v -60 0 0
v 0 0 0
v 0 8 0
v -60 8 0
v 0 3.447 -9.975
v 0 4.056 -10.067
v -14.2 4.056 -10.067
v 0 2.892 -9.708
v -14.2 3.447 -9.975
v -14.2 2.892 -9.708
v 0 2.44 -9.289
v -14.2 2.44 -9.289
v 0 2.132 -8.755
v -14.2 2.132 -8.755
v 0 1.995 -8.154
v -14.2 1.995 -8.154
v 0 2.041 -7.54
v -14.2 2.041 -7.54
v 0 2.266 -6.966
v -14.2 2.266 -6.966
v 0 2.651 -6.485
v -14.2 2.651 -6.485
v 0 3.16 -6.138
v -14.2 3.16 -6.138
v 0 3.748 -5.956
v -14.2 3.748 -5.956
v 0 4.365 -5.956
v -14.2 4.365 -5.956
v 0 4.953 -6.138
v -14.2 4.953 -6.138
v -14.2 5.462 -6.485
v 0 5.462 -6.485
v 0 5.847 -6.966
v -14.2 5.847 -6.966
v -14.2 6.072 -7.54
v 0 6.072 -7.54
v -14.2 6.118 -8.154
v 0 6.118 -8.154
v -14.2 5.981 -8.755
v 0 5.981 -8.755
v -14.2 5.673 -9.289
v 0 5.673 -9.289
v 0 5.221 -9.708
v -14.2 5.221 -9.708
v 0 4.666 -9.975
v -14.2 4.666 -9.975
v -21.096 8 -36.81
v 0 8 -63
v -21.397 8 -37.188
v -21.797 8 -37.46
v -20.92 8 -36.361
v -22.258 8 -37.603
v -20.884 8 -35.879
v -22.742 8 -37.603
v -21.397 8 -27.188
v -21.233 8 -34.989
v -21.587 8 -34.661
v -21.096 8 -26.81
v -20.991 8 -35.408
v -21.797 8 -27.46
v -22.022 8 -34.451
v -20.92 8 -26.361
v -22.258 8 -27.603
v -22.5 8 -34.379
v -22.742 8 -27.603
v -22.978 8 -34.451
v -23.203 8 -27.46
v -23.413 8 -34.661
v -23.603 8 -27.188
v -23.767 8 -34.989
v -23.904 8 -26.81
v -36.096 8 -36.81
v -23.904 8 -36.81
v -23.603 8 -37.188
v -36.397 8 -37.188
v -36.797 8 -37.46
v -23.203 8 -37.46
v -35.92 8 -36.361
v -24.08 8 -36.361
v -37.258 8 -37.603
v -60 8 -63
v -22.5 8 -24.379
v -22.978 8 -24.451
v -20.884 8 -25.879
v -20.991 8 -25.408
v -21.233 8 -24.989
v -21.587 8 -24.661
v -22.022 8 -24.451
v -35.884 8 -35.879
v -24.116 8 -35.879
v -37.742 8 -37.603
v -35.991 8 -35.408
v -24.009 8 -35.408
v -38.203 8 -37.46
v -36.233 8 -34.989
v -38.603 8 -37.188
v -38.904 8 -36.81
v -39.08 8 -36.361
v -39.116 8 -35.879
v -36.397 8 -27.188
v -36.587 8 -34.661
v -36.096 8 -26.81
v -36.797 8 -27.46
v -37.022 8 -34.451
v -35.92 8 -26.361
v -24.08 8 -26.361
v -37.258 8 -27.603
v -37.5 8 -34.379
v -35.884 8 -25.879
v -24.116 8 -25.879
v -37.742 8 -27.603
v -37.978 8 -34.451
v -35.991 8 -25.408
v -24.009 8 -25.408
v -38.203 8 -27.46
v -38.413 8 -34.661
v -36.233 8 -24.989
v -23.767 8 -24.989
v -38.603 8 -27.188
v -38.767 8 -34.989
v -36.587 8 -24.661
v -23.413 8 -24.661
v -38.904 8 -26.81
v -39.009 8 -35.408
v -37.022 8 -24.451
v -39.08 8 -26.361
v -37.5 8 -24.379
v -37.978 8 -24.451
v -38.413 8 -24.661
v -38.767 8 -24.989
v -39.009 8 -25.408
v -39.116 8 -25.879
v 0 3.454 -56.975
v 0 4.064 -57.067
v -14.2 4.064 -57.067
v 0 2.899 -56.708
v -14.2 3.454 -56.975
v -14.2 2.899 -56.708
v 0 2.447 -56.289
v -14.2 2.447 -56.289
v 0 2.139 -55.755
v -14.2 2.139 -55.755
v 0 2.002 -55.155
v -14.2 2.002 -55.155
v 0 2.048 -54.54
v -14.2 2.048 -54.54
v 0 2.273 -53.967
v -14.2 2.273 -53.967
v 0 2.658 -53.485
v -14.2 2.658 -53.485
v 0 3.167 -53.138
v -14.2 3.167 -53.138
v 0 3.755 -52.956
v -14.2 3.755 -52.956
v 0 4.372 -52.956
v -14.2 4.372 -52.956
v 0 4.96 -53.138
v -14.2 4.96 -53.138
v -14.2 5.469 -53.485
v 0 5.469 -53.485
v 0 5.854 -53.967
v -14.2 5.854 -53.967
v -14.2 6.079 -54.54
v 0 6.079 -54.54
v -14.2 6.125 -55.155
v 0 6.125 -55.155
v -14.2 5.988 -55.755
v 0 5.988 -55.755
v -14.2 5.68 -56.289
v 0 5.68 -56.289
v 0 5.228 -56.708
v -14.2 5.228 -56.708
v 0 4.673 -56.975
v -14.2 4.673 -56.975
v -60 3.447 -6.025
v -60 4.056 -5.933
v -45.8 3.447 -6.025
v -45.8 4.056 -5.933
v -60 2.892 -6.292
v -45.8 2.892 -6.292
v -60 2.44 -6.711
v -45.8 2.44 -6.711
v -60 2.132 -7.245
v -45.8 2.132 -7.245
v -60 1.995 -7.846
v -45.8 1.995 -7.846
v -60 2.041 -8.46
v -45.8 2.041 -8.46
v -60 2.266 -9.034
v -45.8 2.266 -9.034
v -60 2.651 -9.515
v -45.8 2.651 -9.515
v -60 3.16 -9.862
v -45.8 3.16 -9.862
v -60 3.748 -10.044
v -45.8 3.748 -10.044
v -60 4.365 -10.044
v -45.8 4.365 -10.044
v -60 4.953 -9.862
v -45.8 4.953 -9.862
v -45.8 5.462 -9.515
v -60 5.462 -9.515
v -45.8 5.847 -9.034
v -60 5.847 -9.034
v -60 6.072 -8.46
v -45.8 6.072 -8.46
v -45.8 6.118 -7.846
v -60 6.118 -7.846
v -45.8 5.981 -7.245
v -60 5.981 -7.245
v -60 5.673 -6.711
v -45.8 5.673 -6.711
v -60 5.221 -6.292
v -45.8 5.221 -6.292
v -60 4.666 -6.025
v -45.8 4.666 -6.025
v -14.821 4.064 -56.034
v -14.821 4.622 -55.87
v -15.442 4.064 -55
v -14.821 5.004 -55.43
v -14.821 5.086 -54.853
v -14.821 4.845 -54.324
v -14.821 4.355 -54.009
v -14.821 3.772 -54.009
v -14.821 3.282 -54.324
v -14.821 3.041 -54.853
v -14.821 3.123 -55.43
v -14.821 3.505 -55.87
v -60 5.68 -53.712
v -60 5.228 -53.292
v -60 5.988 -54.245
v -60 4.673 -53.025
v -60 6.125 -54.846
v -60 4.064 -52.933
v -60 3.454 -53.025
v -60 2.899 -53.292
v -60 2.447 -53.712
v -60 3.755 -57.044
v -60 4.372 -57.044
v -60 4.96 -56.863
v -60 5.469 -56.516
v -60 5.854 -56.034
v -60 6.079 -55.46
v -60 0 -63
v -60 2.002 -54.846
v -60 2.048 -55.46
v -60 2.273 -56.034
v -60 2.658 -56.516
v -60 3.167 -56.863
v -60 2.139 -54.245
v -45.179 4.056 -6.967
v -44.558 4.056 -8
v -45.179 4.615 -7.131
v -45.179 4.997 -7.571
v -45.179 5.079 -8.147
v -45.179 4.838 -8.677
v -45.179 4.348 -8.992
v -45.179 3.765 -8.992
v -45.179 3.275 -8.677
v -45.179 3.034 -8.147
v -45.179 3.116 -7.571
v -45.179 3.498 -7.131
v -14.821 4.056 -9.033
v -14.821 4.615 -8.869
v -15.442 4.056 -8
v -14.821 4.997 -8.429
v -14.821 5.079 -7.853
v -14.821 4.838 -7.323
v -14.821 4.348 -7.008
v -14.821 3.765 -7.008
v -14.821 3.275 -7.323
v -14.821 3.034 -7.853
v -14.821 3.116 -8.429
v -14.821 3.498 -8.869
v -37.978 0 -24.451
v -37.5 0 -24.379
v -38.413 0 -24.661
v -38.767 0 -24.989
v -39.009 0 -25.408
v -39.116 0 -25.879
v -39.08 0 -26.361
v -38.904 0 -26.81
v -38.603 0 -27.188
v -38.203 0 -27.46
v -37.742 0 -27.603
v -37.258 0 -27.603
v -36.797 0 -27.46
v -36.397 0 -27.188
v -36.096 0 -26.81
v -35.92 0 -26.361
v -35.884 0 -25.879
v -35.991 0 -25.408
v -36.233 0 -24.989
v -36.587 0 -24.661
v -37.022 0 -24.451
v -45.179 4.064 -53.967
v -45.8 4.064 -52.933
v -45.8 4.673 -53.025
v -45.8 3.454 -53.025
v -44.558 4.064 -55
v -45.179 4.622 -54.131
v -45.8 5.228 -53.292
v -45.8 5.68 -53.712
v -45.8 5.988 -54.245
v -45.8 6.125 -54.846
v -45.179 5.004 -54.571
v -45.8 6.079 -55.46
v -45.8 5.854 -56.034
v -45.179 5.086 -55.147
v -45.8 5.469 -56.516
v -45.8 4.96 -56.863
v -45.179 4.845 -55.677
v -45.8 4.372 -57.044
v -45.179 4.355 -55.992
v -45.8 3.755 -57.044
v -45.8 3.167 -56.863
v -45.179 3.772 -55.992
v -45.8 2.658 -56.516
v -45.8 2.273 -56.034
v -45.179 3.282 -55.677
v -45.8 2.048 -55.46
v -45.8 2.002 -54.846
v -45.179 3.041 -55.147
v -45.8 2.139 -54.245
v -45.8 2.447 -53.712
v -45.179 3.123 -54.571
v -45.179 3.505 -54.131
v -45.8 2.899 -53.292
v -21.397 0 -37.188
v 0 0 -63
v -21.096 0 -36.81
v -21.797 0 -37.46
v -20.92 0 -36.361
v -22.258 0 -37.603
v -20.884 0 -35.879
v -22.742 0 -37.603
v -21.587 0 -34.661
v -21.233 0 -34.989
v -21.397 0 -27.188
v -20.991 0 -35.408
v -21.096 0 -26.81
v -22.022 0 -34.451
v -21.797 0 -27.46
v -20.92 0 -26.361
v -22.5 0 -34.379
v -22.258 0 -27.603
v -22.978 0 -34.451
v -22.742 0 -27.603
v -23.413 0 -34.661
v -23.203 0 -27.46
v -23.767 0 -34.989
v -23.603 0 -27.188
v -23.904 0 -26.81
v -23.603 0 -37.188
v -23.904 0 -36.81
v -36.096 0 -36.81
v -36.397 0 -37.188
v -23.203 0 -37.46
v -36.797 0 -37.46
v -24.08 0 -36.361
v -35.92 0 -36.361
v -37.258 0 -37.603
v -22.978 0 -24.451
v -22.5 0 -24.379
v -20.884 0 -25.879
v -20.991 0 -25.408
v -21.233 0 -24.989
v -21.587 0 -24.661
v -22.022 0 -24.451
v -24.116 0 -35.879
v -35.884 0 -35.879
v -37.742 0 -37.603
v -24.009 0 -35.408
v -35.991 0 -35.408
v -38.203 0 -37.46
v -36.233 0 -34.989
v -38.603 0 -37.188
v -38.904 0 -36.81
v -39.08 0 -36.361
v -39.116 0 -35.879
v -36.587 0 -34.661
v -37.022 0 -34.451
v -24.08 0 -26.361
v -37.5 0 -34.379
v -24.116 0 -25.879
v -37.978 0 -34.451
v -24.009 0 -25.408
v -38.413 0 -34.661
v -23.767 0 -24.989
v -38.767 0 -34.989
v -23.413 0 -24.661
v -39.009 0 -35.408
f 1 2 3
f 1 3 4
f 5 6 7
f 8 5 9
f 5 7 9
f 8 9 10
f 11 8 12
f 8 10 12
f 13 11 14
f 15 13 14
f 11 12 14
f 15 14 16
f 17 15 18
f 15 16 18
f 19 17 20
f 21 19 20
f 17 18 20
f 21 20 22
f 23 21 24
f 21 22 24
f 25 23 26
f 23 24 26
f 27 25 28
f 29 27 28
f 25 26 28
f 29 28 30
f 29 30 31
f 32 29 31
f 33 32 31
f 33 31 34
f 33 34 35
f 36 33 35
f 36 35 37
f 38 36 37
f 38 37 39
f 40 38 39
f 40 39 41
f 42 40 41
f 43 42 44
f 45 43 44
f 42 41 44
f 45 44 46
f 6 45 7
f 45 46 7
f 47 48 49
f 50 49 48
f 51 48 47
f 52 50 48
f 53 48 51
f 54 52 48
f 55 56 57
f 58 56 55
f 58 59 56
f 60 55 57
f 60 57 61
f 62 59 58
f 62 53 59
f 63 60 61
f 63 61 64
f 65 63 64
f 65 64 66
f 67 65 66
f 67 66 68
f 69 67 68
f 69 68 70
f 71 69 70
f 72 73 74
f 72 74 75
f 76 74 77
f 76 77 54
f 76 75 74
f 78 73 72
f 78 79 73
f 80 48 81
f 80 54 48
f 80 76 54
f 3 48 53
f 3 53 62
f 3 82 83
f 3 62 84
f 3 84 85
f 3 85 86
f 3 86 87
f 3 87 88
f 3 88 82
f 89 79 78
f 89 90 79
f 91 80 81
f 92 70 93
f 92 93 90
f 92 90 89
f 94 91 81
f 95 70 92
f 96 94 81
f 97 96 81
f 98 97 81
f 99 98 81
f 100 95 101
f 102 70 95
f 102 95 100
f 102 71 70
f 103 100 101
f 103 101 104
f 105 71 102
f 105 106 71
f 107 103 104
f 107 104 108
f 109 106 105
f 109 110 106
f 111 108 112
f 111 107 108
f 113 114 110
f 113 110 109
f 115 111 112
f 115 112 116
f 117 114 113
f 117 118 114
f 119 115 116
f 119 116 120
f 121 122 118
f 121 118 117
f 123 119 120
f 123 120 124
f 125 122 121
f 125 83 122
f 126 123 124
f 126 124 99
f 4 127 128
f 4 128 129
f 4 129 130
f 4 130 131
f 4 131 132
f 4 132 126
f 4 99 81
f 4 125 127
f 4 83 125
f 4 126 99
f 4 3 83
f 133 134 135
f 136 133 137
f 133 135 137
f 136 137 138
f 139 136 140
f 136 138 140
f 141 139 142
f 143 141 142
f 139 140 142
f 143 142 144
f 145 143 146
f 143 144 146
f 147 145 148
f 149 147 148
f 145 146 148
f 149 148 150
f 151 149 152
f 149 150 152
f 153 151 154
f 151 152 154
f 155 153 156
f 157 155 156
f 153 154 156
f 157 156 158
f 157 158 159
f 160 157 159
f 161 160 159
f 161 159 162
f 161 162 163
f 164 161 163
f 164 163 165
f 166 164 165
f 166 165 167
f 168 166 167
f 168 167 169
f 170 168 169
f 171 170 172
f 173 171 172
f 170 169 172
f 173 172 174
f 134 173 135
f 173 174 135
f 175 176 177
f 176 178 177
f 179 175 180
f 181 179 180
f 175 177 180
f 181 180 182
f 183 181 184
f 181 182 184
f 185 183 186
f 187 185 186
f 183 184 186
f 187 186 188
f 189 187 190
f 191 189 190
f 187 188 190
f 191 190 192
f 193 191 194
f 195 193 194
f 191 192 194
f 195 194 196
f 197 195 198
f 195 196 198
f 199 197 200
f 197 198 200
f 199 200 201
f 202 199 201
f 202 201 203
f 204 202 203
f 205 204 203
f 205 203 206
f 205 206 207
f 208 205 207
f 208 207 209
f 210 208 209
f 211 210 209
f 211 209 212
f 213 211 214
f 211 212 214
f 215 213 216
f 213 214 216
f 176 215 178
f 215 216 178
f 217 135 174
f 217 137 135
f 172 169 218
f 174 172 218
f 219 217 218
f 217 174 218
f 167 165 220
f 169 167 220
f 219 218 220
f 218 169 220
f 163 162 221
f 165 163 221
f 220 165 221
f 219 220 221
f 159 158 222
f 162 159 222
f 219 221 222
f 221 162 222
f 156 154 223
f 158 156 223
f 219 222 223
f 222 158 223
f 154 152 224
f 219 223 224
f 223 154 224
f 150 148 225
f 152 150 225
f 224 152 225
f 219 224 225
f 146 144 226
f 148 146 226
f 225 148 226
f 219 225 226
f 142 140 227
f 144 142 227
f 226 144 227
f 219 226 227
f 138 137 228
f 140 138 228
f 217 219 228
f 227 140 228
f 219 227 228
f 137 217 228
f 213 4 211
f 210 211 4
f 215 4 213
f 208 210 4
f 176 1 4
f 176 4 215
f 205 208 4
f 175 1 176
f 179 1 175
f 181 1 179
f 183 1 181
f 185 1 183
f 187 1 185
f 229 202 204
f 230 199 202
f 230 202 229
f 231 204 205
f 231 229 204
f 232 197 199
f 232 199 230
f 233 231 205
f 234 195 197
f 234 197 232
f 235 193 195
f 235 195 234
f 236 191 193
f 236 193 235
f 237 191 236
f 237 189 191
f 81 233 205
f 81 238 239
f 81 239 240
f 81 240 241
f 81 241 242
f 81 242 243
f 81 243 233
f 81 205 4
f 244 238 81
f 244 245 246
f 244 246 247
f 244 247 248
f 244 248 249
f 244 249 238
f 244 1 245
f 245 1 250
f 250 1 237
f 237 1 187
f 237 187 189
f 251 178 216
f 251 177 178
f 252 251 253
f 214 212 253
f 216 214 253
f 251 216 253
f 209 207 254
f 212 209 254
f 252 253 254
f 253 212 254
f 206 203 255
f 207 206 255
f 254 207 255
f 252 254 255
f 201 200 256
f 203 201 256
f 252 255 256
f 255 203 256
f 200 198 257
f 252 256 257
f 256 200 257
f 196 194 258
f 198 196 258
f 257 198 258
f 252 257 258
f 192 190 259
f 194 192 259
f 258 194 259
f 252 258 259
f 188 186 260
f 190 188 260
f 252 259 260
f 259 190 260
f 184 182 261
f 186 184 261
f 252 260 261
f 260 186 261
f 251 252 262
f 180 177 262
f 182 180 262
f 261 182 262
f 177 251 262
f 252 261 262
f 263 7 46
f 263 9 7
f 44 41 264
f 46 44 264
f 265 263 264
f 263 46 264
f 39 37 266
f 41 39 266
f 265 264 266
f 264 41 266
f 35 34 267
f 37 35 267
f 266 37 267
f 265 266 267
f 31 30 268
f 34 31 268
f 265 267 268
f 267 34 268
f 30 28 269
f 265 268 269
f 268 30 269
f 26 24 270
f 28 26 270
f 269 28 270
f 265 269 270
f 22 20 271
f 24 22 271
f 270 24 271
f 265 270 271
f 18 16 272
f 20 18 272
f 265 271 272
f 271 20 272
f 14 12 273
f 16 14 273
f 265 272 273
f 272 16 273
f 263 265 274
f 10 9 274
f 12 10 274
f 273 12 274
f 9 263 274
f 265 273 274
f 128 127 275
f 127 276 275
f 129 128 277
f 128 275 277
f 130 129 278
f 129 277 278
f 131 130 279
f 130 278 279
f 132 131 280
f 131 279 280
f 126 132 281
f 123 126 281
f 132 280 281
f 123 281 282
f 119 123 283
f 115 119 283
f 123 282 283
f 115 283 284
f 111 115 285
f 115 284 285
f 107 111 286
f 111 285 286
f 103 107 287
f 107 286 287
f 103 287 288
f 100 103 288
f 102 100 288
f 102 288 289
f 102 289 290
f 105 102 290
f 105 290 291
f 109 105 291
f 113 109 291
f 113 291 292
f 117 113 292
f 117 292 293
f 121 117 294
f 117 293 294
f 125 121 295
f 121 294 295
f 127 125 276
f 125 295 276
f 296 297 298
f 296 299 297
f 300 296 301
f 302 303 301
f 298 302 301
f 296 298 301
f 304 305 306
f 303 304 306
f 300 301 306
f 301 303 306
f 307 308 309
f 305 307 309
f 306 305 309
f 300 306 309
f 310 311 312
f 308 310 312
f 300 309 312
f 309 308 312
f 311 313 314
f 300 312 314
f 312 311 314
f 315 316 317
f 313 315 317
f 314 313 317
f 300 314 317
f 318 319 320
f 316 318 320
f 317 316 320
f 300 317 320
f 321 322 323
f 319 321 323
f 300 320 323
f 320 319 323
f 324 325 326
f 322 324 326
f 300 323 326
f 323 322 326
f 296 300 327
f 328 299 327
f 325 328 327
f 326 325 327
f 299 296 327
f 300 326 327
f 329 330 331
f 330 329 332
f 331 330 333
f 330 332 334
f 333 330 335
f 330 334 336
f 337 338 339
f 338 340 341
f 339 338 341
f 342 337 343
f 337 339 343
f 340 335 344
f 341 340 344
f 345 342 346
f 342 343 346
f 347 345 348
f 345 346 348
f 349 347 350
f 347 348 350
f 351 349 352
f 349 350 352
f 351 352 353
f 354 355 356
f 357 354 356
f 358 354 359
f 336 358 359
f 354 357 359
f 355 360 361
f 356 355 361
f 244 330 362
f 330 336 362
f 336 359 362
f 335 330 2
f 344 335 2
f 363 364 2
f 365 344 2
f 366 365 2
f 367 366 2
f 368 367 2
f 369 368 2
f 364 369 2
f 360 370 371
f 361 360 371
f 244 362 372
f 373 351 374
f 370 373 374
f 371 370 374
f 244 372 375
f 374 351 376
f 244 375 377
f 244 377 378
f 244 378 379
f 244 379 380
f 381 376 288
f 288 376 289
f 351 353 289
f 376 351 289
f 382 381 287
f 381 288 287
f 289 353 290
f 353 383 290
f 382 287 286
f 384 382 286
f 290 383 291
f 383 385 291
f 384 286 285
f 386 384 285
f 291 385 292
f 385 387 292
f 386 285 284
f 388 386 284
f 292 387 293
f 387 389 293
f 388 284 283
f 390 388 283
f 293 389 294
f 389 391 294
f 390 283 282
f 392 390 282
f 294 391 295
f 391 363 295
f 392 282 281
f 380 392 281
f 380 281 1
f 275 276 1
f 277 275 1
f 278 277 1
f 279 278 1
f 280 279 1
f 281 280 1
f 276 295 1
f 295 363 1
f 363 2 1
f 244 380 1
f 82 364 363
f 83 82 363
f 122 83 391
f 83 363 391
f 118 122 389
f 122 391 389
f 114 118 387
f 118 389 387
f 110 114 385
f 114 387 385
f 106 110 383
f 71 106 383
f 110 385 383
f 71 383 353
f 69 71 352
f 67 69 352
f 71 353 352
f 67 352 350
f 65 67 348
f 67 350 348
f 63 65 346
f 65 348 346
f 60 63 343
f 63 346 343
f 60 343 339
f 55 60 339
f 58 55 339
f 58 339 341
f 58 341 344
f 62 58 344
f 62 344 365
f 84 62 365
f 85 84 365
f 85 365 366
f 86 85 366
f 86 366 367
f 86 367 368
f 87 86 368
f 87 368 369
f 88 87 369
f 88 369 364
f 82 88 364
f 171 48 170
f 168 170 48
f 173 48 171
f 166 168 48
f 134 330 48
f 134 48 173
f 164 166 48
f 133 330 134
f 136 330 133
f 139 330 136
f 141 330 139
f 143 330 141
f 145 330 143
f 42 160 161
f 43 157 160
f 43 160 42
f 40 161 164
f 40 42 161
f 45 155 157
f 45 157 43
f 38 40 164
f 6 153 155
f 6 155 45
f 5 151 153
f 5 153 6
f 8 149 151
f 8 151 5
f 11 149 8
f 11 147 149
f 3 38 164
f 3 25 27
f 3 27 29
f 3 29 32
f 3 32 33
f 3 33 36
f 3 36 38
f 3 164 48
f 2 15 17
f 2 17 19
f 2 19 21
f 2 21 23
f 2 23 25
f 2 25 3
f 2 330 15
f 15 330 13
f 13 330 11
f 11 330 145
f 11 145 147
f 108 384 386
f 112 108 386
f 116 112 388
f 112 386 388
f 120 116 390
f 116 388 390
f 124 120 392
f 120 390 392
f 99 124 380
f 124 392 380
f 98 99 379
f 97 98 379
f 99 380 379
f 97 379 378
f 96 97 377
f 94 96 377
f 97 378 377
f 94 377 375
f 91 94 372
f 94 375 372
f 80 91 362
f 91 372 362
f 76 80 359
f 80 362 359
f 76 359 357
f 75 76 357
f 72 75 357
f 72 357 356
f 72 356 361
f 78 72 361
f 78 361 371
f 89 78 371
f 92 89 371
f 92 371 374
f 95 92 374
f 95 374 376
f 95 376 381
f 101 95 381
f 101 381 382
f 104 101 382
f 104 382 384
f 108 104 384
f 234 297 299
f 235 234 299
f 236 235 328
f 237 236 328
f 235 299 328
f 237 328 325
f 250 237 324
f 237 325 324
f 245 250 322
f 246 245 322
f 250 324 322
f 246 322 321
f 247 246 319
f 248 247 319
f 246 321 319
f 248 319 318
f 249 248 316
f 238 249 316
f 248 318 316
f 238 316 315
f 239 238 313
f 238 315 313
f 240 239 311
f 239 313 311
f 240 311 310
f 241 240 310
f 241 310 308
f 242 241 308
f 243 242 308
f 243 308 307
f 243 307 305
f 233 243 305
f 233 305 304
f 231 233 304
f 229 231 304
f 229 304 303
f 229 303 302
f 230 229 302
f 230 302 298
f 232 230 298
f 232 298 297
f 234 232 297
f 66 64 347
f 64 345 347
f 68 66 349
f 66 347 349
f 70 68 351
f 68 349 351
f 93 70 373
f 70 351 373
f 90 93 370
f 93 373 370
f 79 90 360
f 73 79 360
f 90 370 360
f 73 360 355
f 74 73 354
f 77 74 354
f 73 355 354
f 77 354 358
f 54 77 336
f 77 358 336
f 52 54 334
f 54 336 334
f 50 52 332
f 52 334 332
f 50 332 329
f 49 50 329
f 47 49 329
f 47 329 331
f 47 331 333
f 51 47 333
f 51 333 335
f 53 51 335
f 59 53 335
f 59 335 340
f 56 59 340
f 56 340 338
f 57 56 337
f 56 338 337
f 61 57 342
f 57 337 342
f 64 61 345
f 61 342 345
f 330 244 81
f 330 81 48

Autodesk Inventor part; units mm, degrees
ref_plane "YZ Plane" through (0, 0, 0) normal (1, 0, 0) x (0, 1, 0)
ref_plane "XZ Plane" through (0, 0, 0) normal (0, 1, 0) x (-1, 0, 0)
ref_plane "XY Plane" through (0, 0, 0) normal (0, 0, 1) x (1, 0, 0)
sketch "Sketch1" plane through (0, 0, 0) normal (0, 1, 0) x (-1, 0, 0)
  line L0 (0, 0) -> (60, 0)
  line L1 (60, 0) -> (60, -63)
  line L2 (60, -63) -> (0, -63)
  line L3 (0, -63) -> (0, 0)
  dimension "d0" = 60
  dimension "d1" = 63
extrude "Extrusion1" add sketch "Sketch1" along normal blind 8
sketch "Esboço2" plane through (0, 8, 0) normal (0, 1, 0) x (1, 0, 0)
  line L0 (0, 63) -> (-60, 63) projected
  line L1 (-60, 63) -> (-60, 0) projected
  line L2 (-60, 0) -> (0, 0) projected
  point P0 (-37.5, 36)
  point P1 (-22.5, 36)
  point P2 (-22.5, 26)
  point P3 (-37.5, 26)
  dimension "d5" = 0
  dimension "d6" = 15
  dimension "d7" = 0
  dimension "d8" = 15
  dimension "d9" = 10
  dimension "d10" = 0
  dimension "d11" = 60
  dimension "d12" = 22.5
  dimension "d20" = 26
hole "Furo1" at (-37.5, 8, -36) at (-22.5, 8, -36) at (-22.5, 8, -26) at (-37.5, 8, -26) direction (0, -1, 0) diameter 3.242 depth 8 thread size "M4x0.7" class "6H" standard "ISO Metric profile"
sketch "Sketch3" plane through (0, 0, -63) normal (0, 0, -1) x (-1, 0, 0)
  point P0 (0, 0)
sketch "Sketch4" plane through (0, 0, 0) normal (1, 0, 0) x (0, 0, -1)
  line L0 (63, 0) -> (63, 8) projected
  line L1 (0, 0) -> (0, 8) projected
  point P0 (55.0003, 4.0635)
  point P1 (8, 4.0565)
  point P2 (63, 4)
  point P3 (0, 4)
  dimension "d21" = 8
  dimension "d22" = 8
hole "Hole2" at (0, 4.0635, -55.0003) at (0, 4.0565, -8) direction (-1, 0, 0) diameter 4.134 depth 14.2 tip angle 118 thread size "M5x0.8" class "6H" standard "ISO Metric profile"
sketch "Sketch5" plane through (-60, 0, -63) normal (-1, 0, 0) x (0, 0, 1)
  circle A0 centre (55, 4.0565) radius 2.067 projected
  circle A1 centre (7.9997, 4.0635) radius 2.067 projected
  point P0 (63, 0)
hole "Hole3" at (-60, 4.0565, -8) at (-60, 4.0635, -55.0003) direction (1, 0, 0) diameter 4.134 depth 14.2 tip angle 118 thread size "M5x0.8" class "6H" standard "ISO Metric profile"
equation "\"d12\" = -0.5 * d6 + 0.5 * d11"
equation "\"d18\" = Thickness"
equation "\"BendRadius\" = Thickness"
equation "\"BendReliefWidth\" = Thickness"
equation "\"BendReliefDepth\" = 0.5 * Thickness"
equation "\"CornerReliefSize\" = 4 * Thickness"
equation "\"MinimumRemnant\" = 2 * Thickness"
equation "\"TransitionRadius\" = BendRadius"
equation "\"JacobiRadiusSize\" = BendRadius"
equation "\"GapSize\" = Thickness"
equation "\"Thickness\" = 0.5"
properties part number "Frente da caixa de susentação" material "Aluminum 6061"
